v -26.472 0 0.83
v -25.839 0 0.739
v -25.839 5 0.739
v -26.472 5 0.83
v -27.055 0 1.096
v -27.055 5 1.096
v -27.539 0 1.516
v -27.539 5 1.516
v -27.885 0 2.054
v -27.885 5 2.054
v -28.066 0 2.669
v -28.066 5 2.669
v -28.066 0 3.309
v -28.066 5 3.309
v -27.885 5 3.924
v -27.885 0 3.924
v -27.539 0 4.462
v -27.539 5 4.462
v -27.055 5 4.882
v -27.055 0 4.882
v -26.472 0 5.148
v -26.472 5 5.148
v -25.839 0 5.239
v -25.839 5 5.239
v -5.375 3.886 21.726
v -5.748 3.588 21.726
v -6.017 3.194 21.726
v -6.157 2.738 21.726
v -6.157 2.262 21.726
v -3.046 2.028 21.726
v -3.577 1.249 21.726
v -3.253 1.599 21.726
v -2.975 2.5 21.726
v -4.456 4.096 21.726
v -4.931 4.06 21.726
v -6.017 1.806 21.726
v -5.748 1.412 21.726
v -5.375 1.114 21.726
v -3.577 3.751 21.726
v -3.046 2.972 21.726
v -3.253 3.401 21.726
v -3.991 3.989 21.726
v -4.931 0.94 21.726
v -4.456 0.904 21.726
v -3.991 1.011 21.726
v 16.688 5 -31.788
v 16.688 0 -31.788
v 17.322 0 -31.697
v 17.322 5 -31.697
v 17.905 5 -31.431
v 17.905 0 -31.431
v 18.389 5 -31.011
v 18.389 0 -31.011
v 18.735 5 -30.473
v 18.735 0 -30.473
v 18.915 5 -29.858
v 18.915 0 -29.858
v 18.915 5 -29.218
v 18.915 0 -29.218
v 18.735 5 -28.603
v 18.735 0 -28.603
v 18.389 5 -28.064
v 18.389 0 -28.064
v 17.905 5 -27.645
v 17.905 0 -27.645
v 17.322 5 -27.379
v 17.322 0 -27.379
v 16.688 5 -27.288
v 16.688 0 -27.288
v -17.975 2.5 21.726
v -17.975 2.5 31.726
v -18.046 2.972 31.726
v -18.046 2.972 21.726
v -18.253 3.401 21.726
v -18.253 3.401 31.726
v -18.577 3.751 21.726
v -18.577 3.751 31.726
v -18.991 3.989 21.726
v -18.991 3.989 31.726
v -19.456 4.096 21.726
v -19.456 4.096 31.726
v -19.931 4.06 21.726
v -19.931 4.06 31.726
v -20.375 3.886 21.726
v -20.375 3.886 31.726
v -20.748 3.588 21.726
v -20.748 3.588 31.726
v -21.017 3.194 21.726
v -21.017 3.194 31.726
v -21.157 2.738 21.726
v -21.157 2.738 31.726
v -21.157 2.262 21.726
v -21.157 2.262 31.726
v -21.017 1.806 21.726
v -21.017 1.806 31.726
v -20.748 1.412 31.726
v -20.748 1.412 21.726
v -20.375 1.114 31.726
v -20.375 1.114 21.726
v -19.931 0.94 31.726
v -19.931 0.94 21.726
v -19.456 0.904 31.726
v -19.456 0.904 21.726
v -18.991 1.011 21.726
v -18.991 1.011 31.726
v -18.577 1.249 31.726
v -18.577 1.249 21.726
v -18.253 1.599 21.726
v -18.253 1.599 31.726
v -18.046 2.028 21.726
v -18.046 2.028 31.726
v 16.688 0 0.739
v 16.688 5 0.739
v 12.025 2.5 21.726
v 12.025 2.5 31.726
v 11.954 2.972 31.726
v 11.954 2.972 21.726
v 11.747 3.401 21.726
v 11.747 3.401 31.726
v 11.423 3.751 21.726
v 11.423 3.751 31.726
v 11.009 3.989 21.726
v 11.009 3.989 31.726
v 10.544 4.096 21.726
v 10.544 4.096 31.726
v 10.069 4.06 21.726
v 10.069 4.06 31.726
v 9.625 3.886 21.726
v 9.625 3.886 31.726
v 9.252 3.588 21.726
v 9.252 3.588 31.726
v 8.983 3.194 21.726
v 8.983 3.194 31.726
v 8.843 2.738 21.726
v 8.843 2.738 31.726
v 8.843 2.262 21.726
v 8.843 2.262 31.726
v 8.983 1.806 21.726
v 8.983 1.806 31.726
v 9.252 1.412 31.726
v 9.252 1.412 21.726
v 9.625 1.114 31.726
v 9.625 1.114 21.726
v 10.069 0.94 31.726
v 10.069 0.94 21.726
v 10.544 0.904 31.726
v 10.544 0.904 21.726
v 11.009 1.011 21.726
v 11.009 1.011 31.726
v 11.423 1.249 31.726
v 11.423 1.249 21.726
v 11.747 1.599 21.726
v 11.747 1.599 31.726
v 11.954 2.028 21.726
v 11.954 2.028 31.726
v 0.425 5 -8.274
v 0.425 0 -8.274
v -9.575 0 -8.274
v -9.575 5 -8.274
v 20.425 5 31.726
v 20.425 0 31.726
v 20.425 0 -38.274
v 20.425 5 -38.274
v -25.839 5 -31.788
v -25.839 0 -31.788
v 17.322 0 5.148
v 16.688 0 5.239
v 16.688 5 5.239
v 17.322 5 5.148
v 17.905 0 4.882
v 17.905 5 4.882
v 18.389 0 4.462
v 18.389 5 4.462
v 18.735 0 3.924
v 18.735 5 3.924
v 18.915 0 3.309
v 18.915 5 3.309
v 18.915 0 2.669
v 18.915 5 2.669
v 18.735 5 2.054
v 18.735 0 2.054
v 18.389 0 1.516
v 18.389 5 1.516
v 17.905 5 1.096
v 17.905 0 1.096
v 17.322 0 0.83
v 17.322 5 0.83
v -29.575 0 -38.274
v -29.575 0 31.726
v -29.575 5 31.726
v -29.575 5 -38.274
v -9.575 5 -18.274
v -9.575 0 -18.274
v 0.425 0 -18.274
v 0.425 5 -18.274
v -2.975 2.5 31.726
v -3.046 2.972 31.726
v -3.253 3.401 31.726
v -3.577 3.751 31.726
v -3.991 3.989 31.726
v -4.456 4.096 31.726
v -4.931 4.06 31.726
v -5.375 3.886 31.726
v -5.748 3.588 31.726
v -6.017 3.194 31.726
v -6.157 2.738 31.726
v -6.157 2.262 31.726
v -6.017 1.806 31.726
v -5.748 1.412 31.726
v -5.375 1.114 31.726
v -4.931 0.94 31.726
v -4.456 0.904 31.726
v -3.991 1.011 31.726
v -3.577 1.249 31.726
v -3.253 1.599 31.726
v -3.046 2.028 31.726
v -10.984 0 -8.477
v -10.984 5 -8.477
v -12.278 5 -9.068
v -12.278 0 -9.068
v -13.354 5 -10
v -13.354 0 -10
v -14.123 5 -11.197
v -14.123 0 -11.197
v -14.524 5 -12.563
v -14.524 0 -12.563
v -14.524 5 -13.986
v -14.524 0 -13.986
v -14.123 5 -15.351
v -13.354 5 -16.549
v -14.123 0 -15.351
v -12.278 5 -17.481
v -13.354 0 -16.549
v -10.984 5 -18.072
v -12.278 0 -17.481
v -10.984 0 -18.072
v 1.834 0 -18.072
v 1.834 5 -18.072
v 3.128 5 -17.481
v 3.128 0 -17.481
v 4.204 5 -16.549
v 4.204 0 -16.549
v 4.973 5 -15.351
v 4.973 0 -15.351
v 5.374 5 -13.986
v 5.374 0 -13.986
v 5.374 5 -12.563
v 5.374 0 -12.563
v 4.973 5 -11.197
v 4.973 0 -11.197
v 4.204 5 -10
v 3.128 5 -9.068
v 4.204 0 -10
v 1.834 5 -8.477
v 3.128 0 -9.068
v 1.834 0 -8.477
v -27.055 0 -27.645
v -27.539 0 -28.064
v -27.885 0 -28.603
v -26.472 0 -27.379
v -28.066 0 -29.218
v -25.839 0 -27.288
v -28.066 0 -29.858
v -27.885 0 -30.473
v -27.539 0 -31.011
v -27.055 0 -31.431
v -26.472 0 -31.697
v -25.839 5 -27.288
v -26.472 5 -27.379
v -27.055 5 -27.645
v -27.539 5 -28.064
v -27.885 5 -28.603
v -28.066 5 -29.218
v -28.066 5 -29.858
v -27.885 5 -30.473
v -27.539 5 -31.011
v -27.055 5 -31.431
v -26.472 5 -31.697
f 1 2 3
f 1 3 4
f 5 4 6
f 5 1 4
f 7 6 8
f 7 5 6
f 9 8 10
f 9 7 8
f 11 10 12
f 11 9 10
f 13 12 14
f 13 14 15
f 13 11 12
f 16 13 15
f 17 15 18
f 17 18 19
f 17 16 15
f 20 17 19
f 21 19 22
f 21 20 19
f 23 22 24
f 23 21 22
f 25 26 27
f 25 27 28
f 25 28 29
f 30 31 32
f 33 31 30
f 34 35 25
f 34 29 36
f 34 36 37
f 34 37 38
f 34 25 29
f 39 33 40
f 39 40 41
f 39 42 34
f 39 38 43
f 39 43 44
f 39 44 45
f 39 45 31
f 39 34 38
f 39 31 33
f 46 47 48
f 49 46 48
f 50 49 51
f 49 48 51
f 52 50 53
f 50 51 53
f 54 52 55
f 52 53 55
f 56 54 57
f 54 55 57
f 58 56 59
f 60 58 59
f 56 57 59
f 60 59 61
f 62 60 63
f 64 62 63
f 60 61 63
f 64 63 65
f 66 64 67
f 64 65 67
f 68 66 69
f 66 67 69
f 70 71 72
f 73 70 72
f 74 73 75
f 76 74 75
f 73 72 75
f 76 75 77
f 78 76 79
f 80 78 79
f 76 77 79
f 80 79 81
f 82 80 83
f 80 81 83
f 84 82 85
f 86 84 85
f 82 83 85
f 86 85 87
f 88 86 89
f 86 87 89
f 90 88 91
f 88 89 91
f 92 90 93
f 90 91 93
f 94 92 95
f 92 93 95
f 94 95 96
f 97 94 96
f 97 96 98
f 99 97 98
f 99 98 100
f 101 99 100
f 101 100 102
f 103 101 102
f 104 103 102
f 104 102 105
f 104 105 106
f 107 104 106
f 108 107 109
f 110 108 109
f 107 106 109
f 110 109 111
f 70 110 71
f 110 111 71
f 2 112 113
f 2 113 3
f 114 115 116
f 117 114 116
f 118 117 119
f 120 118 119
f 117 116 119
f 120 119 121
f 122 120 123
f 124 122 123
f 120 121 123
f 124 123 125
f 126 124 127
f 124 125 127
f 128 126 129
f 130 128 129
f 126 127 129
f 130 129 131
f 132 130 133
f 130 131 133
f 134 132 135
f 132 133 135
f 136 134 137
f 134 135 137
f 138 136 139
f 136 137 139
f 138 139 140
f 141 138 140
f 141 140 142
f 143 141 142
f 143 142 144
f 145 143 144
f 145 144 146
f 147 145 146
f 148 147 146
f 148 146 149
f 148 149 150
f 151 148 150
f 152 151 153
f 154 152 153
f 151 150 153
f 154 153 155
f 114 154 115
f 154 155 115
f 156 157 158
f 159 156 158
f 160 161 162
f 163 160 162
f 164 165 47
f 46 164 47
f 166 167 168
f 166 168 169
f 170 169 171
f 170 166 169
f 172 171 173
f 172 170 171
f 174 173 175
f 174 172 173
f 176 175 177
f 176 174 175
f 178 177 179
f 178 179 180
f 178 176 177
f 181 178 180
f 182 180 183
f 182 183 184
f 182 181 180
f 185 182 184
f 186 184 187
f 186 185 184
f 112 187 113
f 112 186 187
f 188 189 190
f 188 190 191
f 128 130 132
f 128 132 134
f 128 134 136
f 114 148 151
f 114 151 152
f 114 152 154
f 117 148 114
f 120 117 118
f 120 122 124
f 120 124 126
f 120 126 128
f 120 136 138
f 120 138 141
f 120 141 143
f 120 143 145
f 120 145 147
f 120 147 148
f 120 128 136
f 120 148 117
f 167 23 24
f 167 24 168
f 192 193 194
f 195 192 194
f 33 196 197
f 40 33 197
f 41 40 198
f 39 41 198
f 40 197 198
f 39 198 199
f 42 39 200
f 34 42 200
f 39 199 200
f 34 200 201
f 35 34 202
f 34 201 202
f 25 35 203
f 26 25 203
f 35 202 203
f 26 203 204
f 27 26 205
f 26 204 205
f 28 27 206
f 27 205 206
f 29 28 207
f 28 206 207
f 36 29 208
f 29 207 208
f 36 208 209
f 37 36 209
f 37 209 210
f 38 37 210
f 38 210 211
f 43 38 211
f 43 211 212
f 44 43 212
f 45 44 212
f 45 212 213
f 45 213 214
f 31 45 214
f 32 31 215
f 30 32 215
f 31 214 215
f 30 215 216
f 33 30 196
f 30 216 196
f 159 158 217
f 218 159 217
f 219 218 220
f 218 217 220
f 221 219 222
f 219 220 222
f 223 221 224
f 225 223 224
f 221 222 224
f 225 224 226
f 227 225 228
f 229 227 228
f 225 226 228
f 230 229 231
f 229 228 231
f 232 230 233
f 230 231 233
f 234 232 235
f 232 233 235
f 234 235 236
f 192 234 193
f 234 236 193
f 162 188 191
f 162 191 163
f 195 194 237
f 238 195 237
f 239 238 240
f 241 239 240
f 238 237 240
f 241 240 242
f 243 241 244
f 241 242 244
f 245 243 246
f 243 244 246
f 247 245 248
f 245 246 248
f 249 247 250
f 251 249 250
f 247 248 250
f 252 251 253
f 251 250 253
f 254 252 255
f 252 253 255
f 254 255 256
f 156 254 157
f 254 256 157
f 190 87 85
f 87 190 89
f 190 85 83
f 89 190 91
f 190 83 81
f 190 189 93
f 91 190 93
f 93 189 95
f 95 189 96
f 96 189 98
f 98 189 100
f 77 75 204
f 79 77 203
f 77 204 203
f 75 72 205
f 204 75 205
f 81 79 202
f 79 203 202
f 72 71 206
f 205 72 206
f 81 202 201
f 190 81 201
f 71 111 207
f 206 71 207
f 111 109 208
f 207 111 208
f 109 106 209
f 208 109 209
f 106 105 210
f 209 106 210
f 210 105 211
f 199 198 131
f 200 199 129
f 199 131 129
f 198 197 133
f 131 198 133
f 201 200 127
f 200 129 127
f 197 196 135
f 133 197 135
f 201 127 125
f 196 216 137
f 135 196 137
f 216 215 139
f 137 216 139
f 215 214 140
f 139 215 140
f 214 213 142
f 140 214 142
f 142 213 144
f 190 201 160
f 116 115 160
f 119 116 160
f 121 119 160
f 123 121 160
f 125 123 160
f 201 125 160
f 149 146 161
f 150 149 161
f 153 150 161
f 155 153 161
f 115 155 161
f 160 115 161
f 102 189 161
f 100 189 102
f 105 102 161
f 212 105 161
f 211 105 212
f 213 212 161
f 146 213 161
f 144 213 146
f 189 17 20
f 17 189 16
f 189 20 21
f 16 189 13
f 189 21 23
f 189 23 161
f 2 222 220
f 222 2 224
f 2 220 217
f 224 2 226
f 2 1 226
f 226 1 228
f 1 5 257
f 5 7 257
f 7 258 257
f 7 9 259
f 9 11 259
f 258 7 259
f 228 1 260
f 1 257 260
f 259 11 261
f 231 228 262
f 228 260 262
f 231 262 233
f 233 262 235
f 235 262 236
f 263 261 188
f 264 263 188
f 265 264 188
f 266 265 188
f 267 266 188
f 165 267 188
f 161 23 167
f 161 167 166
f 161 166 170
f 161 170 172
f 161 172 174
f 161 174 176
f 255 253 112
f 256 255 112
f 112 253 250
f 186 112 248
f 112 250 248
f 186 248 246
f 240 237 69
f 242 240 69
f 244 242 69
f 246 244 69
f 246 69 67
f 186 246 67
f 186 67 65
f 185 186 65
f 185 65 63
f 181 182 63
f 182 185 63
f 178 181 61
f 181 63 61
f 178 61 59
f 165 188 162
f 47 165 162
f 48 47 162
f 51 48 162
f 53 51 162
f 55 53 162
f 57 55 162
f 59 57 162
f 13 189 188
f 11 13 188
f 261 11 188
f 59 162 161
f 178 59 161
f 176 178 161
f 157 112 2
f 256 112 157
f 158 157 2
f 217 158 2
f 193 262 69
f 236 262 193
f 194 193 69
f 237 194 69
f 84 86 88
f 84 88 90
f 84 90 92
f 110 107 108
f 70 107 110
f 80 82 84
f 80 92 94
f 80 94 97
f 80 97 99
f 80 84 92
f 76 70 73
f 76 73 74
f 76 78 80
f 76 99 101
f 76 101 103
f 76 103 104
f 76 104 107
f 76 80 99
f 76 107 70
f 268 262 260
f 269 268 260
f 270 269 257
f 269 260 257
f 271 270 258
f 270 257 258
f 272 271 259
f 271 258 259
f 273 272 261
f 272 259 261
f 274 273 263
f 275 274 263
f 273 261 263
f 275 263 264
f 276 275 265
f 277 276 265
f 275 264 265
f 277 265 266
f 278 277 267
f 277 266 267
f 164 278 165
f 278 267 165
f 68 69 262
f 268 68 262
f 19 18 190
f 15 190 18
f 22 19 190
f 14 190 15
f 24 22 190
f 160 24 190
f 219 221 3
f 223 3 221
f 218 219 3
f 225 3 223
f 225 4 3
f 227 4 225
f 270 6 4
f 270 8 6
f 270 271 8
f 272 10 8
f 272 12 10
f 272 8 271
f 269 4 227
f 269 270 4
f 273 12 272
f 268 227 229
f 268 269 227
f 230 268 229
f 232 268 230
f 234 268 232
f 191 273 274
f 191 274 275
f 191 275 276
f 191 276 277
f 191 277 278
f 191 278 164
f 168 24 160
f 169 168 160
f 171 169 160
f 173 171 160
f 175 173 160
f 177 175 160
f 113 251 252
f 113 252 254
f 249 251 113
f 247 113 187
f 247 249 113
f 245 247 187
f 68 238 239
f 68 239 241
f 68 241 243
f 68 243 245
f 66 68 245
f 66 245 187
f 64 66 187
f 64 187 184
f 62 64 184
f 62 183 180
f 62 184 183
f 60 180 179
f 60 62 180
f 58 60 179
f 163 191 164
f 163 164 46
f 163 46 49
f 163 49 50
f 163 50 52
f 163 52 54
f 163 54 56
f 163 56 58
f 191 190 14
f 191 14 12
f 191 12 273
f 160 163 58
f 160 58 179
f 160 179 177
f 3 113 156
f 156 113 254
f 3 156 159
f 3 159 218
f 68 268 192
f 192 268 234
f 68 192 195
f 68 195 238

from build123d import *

# Parameters (mm, degrees)
SKETCH1_W           = 50
SKETCH1_H           = 70
BOSS_EXTRUDE1_DEPTH = 5
SKETCH2_R           = 1.6
CUT_EXTRUDE1_DEPTH  = 10


with BuildPart() as part:
    # Sketch1 → Boss-Extrude1 (new body)
    with BuildSketch(Plane(origin=(0, 0, 0), x_dir=(1, 0, 0), z_dir=(0, 1, 0))):
        with Locations((-4.575074469, 3.274395374)):
            Rectangle(SKETCH1_W, SKETCH1_H)
        with BuildLine():
            Line((-25.838530436, 31.787851342), (16.688381499, 31.787851342))
            ThreePointArc((16.688381499, 31.787851342), (18.938381499, 29.537851342), (16.688381499, 27.287851342))
            Line((16.688381499, 27.287851342), (-25.838530436, 27.287851342))
            ThreePointArc((-25.838530436, 27.287851342), (-28.088530436, 29.537851342), (-25.838530436, 31.787851342))
        make_face(mode=Mode.SUBTRACT)
        with BuildLine():
            Line((-9.575074469, 18.274395374), (0.424925531, 18.274395374))
            ThreePointArc((0.424925531, 18.274395374), (5.424925531, 13.274395374), (0.424925531, 8.274395374))
            Line((0.424925531, 8.274395374), (-9.575074469, 8.274395374))
            ThreePointArc((-9.575074469, 8.274395374), (-14.575074469, 13.274395374), (-9.575074469, 18.274395374))
        make_face(mode=Mode.SUBTRACT)
        with BuildLine():
            Line((-25.838530436, -5.239060593), (16.688381499, -5.239060593))
            ThreePointArc((16.688381499, -5.239060593), (18.938381499, -2.989060593), (16.688381499, -0.739060593))
            Line((16.688381499, -0.739060593), (-25.838530436, -0.739060593))
            ThreePointArc((-25.838530436, -0.739060593), (-28.088530436, -2.989060593), (-25.838530436, -5.239060593))
        make_face(mode=Mode.SUBTRACT)
    extrude(amount=BOSS_EXTRUDE1_DEPTH)

    # Sketch2 → Cut-Extrude1 (cut)
    with BuildSketch(Plane.XY.offset(31.725604626)):
        with Locations((-4.575074469, 2.5)):
            Circle(SKETCH2_R)
        with Locations((-19.575074469, 2.5)):
            Circle(SKETCH2_R)
        with Locations((10.424925531, 2.5)):
            Circle(SKETCH2_R)
    extrude(amount=-CUT_EXTRUDE1_DEPTH, mode=Mode.SUBTRACT)


solid = part.part
